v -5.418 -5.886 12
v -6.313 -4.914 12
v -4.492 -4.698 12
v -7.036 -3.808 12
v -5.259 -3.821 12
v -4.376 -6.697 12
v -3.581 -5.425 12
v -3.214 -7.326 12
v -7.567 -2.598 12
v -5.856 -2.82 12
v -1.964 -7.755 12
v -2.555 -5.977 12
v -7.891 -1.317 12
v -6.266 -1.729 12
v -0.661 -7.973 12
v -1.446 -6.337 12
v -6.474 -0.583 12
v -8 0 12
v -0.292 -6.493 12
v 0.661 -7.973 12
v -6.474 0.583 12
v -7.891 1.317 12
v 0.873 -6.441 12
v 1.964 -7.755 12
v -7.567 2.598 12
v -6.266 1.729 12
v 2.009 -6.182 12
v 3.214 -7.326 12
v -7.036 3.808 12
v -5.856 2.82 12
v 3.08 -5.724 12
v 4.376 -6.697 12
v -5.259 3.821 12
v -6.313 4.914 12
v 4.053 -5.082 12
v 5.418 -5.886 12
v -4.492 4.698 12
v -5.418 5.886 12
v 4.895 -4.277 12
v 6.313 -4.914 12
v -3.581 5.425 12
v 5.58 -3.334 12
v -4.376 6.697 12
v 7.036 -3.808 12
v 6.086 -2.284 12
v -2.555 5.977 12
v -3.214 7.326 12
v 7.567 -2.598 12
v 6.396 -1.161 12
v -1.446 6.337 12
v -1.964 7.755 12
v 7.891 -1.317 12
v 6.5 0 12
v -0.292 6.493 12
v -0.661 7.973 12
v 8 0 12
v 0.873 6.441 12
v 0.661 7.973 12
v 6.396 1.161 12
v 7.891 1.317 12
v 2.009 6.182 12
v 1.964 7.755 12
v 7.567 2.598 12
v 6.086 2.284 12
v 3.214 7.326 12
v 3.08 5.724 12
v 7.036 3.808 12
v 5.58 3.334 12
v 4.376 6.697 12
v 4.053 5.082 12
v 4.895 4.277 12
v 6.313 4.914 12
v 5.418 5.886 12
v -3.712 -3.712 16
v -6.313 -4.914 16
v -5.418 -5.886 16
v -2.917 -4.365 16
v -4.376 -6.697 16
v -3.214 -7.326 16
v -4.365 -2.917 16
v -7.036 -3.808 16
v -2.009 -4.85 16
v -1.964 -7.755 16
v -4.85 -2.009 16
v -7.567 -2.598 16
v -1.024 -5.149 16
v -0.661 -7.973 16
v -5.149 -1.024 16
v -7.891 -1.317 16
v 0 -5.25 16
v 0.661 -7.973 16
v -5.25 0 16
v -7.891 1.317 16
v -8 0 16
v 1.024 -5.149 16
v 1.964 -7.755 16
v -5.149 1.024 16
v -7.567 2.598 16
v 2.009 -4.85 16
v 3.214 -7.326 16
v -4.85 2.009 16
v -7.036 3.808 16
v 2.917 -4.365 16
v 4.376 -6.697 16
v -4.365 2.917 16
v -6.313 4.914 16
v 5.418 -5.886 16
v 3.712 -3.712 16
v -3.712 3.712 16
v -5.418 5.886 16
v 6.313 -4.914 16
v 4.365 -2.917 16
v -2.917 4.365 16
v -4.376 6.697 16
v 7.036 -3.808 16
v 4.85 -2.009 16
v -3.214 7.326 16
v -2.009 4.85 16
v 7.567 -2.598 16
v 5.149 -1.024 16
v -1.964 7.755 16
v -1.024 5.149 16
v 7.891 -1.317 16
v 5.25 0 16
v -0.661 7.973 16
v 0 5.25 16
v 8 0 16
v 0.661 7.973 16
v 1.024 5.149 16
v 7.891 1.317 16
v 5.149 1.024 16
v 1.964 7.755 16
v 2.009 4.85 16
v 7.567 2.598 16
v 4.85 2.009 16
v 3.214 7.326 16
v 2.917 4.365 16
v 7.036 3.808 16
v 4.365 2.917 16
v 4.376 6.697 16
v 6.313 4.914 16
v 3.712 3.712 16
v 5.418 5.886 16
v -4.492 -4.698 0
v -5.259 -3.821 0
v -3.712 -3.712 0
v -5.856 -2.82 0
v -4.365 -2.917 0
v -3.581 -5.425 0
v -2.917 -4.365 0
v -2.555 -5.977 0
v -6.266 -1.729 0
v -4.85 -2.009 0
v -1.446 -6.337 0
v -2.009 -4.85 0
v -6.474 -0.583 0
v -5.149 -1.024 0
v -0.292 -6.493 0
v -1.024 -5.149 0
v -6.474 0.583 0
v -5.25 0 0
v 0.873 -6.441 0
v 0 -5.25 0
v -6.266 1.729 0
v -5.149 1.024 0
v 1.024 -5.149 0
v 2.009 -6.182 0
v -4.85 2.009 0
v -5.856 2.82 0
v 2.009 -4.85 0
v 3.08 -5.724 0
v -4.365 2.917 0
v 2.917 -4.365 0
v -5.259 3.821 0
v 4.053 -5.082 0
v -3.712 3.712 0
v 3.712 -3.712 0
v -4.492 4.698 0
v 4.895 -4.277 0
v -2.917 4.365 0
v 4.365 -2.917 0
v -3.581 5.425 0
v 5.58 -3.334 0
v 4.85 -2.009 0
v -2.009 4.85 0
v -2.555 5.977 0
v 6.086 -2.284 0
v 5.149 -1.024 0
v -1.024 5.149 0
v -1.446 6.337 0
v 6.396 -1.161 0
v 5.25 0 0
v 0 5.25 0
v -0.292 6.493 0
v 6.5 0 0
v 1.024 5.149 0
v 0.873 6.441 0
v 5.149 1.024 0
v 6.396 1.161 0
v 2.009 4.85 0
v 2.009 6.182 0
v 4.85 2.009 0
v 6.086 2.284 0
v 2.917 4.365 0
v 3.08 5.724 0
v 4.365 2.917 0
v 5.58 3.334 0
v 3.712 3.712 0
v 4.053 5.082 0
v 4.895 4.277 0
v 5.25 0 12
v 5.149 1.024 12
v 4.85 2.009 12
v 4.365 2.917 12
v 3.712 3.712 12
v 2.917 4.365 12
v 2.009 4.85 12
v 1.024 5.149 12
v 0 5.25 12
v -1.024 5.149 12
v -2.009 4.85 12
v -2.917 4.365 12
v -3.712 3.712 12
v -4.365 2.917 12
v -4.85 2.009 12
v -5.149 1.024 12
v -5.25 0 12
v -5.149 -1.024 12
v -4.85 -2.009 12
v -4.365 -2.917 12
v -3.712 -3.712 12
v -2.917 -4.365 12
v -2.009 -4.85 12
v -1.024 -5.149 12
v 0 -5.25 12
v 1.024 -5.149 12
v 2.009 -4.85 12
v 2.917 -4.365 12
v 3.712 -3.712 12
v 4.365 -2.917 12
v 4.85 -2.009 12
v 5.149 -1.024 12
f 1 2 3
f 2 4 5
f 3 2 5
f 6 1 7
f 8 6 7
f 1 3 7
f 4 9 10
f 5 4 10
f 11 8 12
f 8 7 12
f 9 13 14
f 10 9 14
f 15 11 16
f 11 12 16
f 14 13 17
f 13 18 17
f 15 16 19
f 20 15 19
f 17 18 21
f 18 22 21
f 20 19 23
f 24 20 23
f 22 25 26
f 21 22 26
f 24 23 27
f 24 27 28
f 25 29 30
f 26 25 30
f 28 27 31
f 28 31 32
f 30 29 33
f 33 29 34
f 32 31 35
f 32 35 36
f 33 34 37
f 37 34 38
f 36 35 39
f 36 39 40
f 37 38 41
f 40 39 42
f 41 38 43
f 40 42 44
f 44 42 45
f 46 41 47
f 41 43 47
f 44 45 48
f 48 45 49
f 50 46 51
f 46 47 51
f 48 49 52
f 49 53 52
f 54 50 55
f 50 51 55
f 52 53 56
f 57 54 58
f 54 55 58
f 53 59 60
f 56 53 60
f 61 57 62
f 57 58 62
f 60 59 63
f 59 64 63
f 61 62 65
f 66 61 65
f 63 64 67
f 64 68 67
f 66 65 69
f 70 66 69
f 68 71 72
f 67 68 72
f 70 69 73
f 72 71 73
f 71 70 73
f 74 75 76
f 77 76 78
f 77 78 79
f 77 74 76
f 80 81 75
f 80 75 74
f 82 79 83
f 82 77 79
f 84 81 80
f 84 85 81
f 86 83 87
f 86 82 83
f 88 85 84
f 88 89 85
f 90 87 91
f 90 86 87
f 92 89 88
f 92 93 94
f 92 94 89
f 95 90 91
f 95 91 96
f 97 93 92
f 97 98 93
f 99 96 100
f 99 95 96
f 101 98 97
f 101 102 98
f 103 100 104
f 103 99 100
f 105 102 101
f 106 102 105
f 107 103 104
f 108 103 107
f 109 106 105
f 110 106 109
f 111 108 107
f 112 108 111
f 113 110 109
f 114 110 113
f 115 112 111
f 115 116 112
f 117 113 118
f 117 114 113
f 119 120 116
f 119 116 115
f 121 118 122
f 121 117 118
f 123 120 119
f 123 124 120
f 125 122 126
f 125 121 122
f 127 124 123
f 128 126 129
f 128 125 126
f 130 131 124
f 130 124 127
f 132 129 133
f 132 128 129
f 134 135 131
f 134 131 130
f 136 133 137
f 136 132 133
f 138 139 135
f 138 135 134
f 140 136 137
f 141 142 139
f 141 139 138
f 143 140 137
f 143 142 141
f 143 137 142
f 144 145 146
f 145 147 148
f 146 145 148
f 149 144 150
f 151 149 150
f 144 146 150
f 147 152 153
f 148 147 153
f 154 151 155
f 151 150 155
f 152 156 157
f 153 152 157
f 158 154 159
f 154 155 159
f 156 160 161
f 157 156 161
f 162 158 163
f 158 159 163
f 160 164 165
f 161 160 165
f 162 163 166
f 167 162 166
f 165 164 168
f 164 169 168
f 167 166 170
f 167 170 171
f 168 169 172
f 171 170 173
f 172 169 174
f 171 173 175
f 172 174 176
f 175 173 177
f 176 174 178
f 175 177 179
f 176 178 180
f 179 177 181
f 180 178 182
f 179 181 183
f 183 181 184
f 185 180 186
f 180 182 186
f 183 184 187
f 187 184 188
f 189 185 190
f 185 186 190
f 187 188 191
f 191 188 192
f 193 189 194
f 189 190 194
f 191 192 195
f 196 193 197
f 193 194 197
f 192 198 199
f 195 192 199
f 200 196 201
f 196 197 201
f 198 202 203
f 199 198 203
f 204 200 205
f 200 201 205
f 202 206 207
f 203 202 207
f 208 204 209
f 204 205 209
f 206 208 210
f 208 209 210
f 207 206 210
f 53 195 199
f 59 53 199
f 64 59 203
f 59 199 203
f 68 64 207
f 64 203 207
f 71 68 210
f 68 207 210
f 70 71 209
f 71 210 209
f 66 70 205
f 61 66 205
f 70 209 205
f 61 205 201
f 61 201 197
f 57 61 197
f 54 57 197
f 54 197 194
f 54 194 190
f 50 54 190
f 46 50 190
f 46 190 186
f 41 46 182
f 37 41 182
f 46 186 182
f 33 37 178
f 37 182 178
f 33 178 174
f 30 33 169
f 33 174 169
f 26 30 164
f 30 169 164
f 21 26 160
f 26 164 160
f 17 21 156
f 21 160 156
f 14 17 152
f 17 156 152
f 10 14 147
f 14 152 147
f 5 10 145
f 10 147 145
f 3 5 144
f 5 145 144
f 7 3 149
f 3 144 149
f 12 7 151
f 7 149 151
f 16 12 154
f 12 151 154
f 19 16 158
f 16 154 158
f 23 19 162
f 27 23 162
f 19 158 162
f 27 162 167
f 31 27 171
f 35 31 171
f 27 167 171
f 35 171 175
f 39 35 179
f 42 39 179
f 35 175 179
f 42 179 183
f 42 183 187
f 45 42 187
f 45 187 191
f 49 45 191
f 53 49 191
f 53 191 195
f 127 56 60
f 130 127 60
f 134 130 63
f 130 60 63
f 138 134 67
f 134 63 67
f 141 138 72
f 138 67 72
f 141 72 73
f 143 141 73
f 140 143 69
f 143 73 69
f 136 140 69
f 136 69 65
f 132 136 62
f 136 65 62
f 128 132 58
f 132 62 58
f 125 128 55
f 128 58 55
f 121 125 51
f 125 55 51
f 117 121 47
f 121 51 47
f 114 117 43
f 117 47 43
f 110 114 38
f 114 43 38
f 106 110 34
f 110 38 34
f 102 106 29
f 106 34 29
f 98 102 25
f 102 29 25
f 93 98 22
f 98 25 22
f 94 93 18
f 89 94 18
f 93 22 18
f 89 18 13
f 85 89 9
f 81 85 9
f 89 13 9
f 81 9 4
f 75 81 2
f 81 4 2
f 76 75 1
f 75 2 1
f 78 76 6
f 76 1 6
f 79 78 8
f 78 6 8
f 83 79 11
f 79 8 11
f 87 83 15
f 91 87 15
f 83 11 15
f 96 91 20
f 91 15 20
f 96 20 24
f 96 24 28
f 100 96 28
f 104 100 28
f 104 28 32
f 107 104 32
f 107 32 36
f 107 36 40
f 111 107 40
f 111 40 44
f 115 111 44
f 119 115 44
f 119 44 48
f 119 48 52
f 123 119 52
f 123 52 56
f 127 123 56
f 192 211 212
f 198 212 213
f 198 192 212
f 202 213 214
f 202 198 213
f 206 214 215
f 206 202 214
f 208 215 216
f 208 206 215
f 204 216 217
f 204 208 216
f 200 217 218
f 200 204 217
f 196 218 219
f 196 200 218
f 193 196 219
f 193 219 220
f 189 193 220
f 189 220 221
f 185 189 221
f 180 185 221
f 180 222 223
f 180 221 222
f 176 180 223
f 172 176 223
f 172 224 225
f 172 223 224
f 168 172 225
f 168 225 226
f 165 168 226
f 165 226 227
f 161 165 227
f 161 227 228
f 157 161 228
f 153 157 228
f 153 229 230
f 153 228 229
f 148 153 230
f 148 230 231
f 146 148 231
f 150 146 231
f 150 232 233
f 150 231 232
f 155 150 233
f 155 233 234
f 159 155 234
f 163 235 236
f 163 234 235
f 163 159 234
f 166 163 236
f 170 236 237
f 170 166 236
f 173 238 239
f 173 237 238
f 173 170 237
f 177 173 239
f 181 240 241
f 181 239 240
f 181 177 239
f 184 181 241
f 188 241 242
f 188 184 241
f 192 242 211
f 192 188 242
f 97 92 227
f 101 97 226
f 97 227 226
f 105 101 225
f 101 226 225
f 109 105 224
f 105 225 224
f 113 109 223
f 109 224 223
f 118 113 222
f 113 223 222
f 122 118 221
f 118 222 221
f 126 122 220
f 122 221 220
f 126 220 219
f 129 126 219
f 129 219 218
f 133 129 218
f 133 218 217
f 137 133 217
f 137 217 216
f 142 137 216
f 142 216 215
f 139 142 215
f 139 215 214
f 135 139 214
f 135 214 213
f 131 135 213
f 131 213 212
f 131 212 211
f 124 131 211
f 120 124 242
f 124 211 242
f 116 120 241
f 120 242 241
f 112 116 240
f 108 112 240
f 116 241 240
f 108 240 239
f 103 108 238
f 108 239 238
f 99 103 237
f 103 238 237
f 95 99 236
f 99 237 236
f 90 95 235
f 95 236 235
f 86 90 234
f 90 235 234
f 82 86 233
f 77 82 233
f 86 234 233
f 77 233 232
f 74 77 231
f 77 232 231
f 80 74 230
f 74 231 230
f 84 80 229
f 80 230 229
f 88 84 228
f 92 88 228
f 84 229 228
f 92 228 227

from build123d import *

# Parameters (mm, degrees)
SKETCH1_R           = 6.5
BOSS_EXTRUDE1_DEPTH = 12
SKETCH2_R           = 5.25
CUT_EXTRUDE1_DEPTH  = 14
SKETCH4_R           = 8
BOSS_EXTRUDE2_DEPTH = 4
SKETCH5_R           = 5.25
CUT_EXTRUDE2_DEPTH  = 17.492422502


with BuildPart() as part:
    # Sketch1 → Boss-Extrude1 (new body)
    with BuildSketch(Plane.XY):
        Circle(SKETCH1_R)
    extrude(amount=BOSS_EXTRUDE1_DEPTH)

    # Sketch2 → Cut-Extrude1 (cut)
    with BuildSketch(Plane.XY):
        Circle(SKETCH2_R)
    extrude(amount=CUT_EXTRUDE1_DEPTH, mode=Mode.SUBTRACT)

    # Sketch4 → Boss-Extrude2 (add)
    with BuildSketch(Plane.XY.offset(12)):
        Circle(SKETCH4_R)
    extrude(amount=BOSS_EXTRUDE2_DEPTH)

    # Sketch5 → Cut-Extrude2 (cut, through all)
    with BuildSketch(Plane(origin=(0, 0, 12), x_dir=(-1, 0, 0), z_dir=(0, 0, -1))):
        Circle(SKETCH5_R)
    extrude(amount=-CUT_EXTRUDE2_DEPTH, mode=Mode.SUBTRACT)


solid = part.part
